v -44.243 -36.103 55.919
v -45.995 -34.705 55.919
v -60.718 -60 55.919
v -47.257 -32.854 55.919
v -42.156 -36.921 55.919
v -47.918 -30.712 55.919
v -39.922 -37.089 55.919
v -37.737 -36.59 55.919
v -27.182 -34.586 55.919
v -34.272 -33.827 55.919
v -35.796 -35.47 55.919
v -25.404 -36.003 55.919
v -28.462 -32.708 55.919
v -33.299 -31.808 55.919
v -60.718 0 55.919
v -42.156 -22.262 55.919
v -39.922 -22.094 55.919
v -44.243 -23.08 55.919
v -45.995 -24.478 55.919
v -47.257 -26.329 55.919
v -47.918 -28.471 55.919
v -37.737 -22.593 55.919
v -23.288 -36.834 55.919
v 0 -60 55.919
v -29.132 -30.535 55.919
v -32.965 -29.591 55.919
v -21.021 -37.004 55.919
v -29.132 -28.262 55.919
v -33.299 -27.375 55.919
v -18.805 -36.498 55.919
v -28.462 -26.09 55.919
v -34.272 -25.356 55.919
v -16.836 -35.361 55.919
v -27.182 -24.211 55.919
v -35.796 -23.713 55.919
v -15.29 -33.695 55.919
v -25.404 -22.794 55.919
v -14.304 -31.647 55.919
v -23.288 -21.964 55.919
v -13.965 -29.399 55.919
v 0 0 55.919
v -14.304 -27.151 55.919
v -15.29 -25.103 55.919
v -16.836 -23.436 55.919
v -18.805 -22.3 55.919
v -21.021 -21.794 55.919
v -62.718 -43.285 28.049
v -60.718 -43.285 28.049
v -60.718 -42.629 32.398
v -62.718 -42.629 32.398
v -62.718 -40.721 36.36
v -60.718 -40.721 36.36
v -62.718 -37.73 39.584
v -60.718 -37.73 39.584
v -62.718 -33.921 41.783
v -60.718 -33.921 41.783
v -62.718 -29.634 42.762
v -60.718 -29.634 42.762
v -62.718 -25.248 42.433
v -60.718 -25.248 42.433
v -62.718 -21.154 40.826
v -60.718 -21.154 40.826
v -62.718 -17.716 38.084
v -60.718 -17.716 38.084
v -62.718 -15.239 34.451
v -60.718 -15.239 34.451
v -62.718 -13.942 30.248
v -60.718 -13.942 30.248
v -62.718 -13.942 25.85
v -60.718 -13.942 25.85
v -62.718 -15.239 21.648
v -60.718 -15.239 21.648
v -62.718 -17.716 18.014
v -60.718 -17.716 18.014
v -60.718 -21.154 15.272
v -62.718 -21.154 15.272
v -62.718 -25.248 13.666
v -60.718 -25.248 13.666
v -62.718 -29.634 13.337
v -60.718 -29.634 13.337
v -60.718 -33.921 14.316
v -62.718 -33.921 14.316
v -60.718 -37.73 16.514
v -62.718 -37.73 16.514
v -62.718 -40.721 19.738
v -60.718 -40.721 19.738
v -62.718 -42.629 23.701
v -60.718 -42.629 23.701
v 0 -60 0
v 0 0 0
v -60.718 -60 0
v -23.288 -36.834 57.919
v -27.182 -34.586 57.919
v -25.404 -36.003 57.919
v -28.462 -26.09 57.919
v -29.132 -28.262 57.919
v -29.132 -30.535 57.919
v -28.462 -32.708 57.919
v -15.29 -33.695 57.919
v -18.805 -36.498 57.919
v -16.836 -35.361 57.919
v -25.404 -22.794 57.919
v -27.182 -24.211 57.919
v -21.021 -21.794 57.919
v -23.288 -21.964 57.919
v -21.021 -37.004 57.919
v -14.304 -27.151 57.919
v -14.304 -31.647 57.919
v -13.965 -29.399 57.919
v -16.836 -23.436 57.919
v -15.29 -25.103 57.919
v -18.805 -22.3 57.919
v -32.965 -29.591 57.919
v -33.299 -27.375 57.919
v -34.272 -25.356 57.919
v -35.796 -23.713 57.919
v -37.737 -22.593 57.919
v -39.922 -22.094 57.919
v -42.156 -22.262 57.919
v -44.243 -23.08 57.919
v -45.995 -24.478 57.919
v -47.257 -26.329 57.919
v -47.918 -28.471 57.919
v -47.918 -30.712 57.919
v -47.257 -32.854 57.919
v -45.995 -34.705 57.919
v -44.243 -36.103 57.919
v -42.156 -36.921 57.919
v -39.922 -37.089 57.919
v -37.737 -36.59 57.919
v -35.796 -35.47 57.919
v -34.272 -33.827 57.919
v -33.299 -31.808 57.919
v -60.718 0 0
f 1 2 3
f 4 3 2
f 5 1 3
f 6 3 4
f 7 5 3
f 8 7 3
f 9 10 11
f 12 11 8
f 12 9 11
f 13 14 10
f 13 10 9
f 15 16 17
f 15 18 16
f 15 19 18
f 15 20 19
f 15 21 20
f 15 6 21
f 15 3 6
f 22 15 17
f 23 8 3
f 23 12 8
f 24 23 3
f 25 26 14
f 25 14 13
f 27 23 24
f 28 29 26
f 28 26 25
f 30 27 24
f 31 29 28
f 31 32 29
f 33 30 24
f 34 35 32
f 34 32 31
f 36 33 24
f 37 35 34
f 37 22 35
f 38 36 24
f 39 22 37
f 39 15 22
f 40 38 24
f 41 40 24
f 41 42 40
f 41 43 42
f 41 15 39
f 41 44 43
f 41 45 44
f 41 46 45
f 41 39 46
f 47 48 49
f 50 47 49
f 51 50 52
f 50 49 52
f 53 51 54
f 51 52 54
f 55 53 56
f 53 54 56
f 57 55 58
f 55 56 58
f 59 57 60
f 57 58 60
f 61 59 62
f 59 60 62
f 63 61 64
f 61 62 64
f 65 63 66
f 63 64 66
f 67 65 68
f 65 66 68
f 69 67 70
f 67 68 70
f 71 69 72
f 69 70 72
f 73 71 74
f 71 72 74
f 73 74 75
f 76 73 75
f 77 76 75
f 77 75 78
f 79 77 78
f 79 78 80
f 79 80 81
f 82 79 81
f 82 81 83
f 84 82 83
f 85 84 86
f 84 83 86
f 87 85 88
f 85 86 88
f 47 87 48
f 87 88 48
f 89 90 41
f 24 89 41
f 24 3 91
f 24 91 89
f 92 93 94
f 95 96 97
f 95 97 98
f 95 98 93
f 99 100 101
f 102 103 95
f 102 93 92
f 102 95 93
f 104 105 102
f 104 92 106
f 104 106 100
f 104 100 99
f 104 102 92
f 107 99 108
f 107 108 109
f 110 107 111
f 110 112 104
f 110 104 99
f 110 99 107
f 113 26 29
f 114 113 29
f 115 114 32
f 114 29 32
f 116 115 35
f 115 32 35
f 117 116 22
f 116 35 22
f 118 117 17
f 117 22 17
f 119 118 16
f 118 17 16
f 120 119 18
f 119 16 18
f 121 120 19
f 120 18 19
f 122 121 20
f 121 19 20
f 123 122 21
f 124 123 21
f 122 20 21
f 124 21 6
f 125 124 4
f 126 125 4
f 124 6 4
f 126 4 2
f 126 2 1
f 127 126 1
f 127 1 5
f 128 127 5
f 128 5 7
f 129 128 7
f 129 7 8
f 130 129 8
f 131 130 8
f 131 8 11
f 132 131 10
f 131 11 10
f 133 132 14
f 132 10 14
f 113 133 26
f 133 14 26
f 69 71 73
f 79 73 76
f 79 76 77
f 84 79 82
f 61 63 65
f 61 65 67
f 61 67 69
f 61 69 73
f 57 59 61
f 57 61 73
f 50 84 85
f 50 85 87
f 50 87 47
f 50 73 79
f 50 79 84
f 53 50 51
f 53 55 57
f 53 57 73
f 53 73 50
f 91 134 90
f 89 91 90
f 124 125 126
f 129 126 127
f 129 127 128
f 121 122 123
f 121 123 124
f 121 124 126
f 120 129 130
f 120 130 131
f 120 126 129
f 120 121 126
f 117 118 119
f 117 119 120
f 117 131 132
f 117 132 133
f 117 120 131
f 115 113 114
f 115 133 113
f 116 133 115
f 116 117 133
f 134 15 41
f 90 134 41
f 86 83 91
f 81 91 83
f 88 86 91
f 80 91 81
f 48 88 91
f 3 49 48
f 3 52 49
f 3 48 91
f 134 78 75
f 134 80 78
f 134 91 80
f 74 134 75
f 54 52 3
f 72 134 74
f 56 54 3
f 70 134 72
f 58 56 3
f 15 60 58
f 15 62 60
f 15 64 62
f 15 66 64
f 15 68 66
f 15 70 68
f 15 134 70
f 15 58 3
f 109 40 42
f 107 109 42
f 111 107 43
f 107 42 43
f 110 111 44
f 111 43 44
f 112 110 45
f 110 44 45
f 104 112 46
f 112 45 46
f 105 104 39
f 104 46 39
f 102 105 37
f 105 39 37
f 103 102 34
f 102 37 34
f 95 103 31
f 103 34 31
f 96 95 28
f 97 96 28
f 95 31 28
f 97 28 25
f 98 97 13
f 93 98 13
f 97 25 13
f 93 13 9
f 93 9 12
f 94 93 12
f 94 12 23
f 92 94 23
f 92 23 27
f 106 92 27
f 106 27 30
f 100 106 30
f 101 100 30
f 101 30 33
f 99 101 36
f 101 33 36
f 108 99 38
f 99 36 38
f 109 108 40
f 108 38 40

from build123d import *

# Parameters (mm, degrees)
F0_W     = 60.7175044715
F0_H     = 55.9188649058
F0_R     = 7.6059383026
F1_DEPTH = 60
F2_R     = 14.7535326744
F3_DEPTH = 2
F4_R     = 7.5183585286
F6_DEPTH = 2
F5_R     = 7.6263318458
F7_DEPTH = 2


with BuildPart() as f1:
    # F0 (on Front) → F1 (new body)
    with BuildSketch(Plane.XZ):
        with Locations((-30.3587522358, 27.9594324529)):
            Rectangle(F0_W, F0_H)
        with Locations((-31.1422031373, 29.4773690403)):
            Circle(F0_R, mode=Mode.SUBTRACT)
        with Locations((-31.1422031373, 29.4773690403)):
            Circle(F0_R)
    extrude(amount=F1_DEPTH)

    # F2 (on face) → F3 (join)
    with BuildSketch(Plane(origin=(-60.7175044715, 0, 0), x_dir=(0, -1, 0), z_dir=(-1, 0, 0))):
        with Locations((28.531210497, 28.0492659658)):
            Circle(F2_R)
    extrude(amount=F3_DEPTH)

    # F4 (on face) → F6 (join)
    with BuildSketch(Plane.XY.offset(55.9188649058)):
        with Locations((-40.4834784567, -29.5914951712)):
            Circle(F4_R)
    extrude(amount=F6_DEPTH)

    # F5 (on face) → F7 (join)
    with BuildSketch(Plane.XY.offset(55.9188649058)):
        with Locations((-21.5911883861, -29.3987151235)):
            Circle(F5_R)
    extrude(amount=F7_DEPTH)


solid = f1.part
